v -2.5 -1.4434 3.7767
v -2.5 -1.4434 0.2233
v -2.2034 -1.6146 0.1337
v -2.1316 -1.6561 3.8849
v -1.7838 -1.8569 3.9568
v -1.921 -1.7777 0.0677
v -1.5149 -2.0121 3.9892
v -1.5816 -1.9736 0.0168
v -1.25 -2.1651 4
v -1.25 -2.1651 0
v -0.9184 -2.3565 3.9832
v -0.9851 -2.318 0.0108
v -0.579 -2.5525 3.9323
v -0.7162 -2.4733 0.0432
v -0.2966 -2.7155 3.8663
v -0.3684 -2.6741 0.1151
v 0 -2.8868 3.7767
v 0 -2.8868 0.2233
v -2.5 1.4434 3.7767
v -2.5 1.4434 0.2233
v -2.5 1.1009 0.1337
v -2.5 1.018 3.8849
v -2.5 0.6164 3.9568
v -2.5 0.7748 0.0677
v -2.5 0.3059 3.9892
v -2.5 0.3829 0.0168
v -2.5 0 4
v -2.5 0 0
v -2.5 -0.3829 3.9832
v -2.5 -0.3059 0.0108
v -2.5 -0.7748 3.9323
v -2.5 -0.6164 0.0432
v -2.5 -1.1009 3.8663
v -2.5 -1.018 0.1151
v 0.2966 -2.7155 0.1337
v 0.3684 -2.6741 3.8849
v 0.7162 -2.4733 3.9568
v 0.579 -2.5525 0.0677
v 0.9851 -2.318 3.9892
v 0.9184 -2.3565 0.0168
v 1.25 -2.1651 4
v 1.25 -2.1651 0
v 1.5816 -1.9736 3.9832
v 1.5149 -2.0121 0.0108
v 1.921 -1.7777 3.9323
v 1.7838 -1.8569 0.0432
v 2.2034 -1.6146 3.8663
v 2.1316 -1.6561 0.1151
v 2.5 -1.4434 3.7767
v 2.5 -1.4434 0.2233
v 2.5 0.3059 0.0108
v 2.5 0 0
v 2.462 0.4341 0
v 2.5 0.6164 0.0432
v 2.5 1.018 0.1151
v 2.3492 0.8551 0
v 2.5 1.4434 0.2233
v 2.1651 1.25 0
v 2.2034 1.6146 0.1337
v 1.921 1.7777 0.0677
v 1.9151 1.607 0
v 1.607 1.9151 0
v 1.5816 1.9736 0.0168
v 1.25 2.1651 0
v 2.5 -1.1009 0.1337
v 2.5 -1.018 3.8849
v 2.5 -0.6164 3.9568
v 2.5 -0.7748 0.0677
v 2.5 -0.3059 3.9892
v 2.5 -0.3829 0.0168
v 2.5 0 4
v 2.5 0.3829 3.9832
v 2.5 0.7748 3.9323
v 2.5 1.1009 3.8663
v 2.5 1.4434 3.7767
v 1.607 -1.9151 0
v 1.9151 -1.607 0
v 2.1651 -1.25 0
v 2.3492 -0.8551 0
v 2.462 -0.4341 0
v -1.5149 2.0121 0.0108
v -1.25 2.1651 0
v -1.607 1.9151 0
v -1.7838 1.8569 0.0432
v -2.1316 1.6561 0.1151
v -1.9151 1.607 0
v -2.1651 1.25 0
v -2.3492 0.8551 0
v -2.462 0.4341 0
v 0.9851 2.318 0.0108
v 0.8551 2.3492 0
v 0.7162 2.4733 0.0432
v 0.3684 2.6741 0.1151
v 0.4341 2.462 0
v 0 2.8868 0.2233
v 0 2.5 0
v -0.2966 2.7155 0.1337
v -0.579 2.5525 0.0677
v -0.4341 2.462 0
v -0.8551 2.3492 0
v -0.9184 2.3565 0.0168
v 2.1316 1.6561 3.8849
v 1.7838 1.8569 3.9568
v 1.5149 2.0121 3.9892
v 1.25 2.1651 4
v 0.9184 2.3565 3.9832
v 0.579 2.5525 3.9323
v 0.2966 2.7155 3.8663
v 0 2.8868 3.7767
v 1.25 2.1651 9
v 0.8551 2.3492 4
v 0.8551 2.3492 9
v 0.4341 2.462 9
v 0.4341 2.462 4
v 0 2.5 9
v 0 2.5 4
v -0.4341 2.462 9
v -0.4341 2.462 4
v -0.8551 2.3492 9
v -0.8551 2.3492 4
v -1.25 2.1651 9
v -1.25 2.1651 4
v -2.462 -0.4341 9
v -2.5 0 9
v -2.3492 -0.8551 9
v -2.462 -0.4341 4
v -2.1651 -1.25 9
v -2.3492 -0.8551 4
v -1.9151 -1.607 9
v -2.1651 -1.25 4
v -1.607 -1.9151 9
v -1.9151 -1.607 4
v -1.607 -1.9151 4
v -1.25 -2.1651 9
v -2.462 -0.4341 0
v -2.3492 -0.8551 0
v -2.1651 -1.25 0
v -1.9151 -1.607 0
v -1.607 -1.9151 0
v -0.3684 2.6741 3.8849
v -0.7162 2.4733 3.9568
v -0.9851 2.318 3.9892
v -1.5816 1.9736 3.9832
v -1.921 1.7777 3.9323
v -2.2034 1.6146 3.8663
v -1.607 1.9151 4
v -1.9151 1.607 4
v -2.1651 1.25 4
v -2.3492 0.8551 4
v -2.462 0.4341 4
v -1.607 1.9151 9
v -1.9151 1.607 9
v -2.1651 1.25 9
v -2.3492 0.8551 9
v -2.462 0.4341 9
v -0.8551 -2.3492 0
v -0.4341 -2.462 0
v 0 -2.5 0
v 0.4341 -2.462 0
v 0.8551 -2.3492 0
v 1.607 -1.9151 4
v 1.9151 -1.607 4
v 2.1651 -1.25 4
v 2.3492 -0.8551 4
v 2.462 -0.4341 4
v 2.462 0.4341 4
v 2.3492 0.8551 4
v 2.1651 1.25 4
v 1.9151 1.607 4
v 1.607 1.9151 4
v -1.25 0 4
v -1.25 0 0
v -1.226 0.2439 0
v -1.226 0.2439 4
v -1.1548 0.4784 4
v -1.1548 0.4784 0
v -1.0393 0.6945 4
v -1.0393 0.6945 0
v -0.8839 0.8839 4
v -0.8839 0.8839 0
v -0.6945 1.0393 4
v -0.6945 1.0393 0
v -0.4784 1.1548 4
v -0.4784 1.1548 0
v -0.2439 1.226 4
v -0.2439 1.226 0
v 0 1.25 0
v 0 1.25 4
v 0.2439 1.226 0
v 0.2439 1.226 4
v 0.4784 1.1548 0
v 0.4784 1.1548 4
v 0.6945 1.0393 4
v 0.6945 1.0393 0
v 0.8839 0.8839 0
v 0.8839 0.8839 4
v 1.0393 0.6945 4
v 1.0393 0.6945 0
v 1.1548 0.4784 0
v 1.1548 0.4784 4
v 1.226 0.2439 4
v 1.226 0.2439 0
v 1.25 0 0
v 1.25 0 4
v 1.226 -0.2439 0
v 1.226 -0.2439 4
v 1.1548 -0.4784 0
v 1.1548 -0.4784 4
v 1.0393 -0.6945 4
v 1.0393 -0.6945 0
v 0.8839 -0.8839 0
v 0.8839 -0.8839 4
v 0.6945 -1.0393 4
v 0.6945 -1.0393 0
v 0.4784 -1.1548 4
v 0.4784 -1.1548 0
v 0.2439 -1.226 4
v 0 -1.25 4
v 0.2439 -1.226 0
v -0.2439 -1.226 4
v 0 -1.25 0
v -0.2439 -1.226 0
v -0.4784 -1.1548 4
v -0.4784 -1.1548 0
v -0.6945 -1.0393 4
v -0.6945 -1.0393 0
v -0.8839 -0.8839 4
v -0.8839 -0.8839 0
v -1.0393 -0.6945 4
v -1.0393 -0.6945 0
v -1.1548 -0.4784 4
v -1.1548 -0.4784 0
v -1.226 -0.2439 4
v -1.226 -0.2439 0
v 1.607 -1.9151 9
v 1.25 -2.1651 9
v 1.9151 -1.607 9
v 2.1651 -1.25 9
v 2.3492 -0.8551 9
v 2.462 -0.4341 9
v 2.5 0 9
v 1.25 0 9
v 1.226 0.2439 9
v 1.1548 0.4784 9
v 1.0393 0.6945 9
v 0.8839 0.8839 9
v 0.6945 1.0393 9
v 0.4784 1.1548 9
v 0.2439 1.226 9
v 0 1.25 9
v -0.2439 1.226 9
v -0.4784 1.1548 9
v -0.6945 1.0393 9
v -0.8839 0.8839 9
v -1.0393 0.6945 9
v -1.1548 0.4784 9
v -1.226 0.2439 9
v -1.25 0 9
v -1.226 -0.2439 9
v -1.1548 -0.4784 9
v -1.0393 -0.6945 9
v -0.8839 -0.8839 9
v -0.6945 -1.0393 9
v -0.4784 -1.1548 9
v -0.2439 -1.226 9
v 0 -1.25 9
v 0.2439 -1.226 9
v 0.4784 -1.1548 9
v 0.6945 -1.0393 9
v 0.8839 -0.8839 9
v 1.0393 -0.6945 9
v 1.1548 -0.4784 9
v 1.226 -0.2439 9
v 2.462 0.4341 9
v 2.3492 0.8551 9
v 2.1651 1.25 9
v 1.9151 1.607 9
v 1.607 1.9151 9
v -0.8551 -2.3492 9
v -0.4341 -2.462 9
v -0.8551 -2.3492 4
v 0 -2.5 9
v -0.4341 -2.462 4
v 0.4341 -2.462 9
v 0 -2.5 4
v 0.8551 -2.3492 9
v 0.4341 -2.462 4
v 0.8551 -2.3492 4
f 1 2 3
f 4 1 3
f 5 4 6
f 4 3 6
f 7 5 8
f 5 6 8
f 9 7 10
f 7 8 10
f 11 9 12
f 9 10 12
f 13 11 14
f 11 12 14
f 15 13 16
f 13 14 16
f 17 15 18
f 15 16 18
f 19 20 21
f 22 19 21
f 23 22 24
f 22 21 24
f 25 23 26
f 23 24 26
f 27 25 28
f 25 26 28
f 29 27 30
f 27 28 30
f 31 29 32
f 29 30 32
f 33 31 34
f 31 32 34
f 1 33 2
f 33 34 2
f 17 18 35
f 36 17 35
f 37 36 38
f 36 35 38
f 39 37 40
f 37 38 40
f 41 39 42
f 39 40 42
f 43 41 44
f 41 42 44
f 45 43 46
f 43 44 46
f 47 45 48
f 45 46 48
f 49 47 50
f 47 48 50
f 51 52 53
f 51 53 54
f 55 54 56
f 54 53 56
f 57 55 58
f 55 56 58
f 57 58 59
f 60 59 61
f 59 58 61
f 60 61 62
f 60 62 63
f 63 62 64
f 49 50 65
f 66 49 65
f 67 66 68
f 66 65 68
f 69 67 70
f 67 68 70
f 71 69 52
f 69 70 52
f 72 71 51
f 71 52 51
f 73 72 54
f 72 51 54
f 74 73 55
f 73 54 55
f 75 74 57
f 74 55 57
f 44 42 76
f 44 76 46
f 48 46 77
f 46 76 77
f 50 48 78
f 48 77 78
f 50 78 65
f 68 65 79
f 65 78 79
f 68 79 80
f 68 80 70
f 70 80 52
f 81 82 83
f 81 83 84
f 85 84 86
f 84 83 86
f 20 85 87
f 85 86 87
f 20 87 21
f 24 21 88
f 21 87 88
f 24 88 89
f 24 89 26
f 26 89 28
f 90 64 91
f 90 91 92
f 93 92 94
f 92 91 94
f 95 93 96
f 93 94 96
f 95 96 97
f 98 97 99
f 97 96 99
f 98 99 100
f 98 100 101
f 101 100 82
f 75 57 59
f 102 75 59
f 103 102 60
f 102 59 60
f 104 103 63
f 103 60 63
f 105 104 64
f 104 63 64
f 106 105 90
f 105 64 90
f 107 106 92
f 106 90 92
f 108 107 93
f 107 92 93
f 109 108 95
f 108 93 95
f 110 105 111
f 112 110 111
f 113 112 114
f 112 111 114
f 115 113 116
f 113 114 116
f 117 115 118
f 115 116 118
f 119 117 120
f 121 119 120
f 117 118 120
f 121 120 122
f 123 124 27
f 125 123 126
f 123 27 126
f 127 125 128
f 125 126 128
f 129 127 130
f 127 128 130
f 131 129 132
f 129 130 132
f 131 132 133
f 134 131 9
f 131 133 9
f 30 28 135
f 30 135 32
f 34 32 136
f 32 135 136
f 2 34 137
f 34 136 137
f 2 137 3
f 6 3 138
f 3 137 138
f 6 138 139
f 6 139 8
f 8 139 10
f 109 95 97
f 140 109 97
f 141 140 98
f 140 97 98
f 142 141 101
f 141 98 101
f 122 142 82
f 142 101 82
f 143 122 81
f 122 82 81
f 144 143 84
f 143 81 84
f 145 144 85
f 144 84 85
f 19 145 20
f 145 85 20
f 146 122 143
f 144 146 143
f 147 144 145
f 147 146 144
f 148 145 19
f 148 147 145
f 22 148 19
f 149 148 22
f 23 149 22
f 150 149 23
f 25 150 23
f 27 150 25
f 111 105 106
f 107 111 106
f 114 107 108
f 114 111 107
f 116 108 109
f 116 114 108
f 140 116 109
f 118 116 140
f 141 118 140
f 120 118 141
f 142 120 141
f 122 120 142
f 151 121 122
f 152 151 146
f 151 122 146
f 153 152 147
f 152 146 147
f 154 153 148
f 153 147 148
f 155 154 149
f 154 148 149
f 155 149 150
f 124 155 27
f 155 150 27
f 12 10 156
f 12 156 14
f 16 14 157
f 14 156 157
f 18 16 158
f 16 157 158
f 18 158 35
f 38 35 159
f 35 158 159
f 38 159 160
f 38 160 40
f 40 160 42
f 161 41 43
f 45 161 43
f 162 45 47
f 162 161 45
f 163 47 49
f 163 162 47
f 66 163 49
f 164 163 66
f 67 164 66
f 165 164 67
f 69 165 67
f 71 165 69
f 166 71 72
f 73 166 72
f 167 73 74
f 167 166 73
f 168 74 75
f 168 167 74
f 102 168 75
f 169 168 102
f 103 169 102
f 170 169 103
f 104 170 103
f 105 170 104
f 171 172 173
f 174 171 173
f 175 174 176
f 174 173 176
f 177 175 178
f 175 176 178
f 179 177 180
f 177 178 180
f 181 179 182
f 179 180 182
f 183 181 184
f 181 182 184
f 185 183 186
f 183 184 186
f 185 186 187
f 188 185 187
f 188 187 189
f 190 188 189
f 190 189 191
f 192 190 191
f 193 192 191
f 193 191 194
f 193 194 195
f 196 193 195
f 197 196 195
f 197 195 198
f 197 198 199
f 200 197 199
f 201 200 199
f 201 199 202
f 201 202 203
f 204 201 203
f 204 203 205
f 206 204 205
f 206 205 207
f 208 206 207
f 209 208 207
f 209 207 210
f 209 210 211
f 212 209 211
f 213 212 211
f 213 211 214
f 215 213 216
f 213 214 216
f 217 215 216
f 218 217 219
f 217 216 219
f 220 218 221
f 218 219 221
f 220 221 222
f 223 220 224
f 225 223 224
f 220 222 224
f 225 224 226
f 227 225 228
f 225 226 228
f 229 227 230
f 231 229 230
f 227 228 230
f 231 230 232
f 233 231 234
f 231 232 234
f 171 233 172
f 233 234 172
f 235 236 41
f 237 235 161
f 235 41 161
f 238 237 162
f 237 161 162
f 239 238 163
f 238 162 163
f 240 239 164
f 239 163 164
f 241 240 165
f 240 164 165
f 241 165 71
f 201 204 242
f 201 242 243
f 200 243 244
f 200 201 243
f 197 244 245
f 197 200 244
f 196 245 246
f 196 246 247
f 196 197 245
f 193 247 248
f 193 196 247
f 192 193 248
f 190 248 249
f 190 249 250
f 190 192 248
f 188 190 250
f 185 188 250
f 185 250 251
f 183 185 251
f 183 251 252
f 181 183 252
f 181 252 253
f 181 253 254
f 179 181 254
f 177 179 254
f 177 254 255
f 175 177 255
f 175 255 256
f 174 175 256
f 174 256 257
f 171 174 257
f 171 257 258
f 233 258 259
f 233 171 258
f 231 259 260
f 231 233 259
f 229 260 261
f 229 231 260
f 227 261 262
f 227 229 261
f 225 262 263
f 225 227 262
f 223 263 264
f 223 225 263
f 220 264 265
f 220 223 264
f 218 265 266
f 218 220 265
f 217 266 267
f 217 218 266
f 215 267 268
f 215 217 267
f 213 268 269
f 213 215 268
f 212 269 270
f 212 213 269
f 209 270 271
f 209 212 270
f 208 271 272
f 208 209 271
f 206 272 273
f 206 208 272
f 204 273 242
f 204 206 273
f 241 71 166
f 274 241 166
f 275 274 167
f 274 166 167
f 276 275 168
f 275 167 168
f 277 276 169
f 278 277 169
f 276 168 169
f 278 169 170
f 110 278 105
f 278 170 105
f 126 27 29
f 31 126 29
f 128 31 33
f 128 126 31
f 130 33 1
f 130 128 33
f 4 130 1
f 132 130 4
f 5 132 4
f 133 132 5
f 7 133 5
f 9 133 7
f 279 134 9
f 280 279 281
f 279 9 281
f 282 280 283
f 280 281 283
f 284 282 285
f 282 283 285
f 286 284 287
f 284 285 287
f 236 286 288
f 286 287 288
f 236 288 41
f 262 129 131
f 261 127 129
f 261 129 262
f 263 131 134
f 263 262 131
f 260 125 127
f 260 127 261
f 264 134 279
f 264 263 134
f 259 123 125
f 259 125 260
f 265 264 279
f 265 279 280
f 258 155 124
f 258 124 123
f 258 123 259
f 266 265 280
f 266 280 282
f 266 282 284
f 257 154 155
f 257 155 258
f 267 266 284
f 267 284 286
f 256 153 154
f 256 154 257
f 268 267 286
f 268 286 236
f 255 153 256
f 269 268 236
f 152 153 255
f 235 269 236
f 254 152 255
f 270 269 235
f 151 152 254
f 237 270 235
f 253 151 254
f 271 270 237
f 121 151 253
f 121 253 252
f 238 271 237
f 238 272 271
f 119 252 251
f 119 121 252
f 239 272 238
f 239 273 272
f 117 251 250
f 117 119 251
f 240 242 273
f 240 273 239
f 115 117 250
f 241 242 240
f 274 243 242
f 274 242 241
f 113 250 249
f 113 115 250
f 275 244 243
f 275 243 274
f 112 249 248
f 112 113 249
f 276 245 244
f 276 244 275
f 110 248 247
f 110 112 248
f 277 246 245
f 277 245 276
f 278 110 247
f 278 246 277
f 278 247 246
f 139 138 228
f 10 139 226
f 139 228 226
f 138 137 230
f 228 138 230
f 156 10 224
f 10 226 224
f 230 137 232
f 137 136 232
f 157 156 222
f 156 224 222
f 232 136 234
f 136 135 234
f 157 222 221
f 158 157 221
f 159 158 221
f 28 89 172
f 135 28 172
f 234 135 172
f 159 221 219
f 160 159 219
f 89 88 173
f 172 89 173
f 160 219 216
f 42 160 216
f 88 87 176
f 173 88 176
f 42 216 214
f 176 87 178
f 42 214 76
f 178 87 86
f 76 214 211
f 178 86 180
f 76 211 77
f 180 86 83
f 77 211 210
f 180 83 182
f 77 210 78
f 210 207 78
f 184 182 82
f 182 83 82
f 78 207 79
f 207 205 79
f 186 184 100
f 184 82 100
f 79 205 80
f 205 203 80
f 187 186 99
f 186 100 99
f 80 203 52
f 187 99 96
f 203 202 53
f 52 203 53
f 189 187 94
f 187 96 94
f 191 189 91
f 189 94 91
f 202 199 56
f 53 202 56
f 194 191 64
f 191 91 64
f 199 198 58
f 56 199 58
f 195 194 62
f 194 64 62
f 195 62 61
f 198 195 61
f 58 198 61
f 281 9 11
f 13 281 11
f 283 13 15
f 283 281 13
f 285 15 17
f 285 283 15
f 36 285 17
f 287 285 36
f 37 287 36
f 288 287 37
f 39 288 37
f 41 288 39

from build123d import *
from build123d.topology import SkipClean

# Parameters (mm, degrees)
BOSS_EXTRUDE1_DEPTH       = 4
M3X0_5_TAPPED_HOLE1_D     = 2.5
M3X0_5_TAPPED_HOLE1_DEPTH = 7.5
M3X0_5_TAPPED_HOLE1_TIP   = 0.751075774
SKETCH5_R                 = 1.25
BOSS_EXTRUDE2_DEPTH       = 5


with BuildPart() as part:
    # Sketch1 → Boss-Extrude1 (new body)
    with BuildSketch(Plane.XY):
        Polygon((0, 2.886751346), (-2.5, 1.443375673), (-2.5, -1.443375673), (0, -2.886751346), (2.5, -1.443375673), (2.5, 1.443375673), align=None)
    extrude(amount=BOSS_EXTRUDE1_DEPTH)

    # M3x0.5 Tapped Hole1
    with Locations(Plane.XY.offset(4)):
        with Locations((0, 0)):
            Hole(M3X0_5_TAPPED_HOLE1_D / 2, depth=M3X0_5_TAPPED_HOLE1_DEPTH)
            with Locations((0, 0, -(M3X0_5_TAPPED_HOLE1_DEPTH + M3X0_5_TAPPED_HOLE1_TIP / 2))):  # 118° drill point
                Cone(0, M3X0_5_TAPPED_HOLE1_D / 2, M3X0_5_TAPPED_HOLE1_TIP, mode=Mode.SUBTRACT)

    # Sketch4 → Cut-Revolve1 (revolve, cut)
    with BuildSketch(Plane(origin=(0, 0, 0), x_dir=(0, 0, -1), z_dir=(1, 0, 0))):
        Polygon((-3.776709006, 2.886751346), (-4, 2.5), (-4, 2.886751346), align=None)
        Polygon((0, 2.886751346), (-0.223290994, 2.886751346), (0, 2.5), align=None)
    revolve(axis=Axis((0, 0, 0), (0, 0, 1)), mode=Mode.SUBTRACT)

    # Sketch5 → Boss-Extrude2 (add)
    with SkipClean():  # the faces are left unmerged after this step: merging them gives an invalid solid
        with BuildSketch(Plane.XY.offset(4)):
            with BuildLine():
                ThreePointArc((1.25, -2.165063509), (2.165063509, -1.25), (2.5, 0))
                ThreePointArc((2.5, 0), (2.165063509, 1.25), (1.25, 2.165063509))
                ThreePointArc((1.25, 2.165063509), (0, 2.5), (-1.25, 2.165063509))
                ThreePointArc((-1.25, 2.165063509), (-2.165063509, 1.25), (-2.5, 0))
                ThreePointArc((-2.5, 0), (-2.165063509, -1.25), (-1.25, -2.165063509))
                ThreePointArc((-1.25, -2.165063509), (0, -2.5), (1.25, -2.165063509))
            make_face()
            Circle(SKETCH5_R, mode=Mode.SUBTRACT)
        extrude(amount=BOSS_EXTRUDE2_DEPTH)
    add(part.part.scale(1), mode=Mode.REPLACE)  # the faces are merged on a copy


solid = part.part
